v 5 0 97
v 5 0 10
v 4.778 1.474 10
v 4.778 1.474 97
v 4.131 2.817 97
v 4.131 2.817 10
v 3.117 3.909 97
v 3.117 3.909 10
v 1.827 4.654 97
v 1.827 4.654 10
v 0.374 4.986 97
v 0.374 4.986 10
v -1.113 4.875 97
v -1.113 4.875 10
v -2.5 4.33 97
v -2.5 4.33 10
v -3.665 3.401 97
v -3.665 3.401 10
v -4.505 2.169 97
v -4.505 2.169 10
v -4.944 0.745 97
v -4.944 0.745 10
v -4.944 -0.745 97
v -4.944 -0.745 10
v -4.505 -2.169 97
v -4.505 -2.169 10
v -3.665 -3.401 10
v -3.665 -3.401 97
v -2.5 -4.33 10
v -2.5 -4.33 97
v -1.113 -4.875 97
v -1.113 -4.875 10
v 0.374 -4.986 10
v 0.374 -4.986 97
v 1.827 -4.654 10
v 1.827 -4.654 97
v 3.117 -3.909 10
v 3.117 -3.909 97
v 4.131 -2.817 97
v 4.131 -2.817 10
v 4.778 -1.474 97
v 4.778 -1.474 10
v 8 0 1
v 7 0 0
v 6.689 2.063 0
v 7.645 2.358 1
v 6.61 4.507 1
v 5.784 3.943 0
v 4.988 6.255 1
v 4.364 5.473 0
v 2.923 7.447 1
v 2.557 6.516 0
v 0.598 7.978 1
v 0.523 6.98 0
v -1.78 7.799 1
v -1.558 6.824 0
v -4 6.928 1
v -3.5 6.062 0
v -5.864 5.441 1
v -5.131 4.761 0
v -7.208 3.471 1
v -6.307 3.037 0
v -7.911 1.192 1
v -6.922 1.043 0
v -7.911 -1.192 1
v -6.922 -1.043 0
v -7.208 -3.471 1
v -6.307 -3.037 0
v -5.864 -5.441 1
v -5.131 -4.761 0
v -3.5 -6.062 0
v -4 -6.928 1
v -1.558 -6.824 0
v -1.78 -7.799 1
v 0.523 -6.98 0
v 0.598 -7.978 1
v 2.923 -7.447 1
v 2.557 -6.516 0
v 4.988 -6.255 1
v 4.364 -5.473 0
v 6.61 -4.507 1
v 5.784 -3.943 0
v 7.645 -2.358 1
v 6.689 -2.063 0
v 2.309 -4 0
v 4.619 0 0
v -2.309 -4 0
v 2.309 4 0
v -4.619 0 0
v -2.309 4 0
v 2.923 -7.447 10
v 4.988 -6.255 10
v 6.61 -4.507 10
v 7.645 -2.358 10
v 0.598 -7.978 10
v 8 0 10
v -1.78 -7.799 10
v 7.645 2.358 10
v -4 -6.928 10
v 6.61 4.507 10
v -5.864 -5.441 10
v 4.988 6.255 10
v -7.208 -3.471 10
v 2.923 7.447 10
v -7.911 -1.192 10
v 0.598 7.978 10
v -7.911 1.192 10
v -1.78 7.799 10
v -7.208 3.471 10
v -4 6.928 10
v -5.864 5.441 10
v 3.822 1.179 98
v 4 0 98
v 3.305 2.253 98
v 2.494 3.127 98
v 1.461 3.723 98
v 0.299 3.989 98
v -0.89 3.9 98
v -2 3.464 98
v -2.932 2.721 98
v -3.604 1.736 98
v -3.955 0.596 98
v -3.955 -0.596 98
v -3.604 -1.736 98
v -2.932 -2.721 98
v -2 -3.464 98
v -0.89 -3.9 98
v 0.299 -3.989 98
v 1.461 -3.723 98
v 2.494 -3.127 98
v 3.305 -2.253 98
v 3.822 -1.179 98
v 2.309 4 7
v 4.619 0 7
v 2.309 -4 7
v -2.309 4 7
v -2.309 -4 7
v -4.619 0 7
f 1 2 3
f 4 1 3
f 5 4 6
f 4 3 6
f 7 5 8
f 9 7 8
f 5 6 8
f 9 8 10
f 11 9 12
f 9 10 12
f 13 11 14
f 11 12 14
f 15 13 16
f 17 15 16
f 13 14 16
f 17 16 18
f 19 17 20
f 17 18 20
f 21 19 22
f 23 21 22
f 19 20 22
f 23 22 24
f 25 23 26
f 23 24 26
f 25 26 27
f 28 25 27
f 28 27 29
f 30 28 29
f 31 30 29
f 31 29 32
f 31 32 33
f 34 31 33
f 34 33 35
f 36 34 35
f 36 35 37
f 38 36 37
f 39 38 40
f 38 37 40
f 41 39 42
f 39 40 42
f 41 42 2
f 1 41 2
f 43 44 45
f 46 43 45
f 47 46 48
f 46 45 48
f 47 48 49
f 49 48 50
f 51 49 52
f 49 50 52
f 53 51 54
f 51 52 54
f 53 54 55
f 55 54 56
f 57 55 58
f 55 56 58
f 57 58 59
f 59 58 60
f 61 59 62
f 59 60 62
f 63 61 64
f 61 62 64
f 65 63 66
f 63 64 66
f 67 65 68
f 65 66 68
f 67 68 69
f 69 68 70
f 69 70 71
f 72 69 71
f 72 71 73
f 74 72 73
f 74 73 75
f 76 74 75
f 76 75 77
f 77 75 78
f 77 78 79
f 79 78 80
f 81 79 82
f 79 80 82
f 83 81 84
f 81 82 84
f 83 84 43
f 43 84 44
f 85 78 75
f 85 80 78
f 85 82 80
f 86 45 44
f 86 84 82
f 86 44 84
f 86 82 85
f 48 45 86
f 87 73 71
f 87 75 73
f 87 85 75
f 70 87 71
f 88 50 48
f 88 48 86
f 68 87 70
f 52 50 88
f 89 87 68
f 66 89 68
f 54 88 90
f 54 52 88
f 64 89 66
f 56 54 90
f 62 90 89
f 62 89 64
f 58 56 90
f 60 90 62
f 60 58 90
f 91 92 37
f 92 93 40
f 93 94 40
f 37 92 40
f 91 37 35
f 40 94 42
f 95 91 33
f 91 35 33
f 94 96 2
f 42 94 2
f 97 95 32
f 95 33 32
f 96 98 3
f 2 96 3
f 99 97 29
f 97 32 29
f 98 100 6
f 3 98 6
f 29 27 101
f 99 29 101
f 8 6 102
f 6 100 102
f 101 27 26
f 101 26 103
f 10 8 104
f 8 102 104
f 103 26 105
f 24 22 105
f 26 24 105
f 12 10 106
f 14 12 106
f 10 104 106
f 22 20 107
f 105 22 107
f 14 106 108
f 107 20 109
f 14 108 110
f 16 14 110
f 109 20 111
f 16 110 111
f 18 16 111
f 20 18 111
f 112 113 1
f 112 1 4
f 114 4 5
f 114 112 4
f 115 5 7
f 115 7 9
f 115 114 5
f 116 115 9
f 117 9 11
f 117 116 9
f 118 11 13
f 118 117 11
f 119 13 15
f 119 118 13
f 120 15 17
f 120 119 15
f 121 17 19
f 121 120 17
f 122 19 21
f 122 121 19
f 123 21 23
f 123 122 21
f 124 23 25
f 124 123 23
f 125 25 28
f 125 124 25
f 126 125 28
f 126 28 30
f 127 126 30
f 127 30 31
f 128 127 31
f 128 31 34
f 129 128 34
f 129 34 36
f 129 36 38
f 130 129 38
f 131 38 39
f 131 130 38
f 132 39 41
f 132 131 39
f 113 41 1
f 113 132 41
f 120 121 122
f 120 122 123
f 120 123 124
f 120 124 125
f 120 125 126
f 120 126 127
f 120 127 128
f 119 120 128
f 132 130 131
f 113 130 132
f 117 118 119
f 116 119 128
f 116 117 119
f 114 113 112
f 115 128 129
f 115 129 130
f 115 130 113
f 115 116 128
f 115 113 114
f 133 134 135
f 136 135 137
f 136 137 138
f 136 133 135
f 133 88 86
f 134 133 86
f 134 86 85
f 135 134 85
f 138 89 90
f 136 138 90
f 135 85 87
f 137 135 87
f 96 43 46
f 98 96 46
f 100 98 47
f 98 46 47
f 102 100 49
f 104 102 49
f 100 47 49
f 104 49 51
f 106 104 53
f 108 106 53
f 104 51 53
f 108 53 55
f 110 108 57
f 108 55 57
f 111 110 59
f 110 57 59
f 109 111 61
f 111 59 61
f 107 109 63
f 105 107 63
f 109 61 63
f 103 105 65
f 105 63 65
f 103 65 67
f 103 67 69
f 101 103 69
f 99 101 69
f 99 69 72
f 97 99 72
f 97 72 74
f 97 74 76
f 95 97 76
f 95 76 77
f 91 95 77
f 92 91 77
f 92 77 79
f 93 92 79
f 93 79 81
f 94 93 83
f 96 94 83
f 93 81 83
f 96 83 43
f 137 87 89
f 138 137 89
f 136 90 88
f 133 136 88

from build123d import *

# Parameters (mm, degrees)
SKETCH_1_W          = 8
SKETCH_1_H          = 10
SKETCH_2_R          = 5
EXTRUDE_1_DEPTH     = 88
CUT_EXTRUDE_1_DEPTH = 7
CHAMFER_1_SIZE2     = 1.000000001
CHAMFER_1_SIZE      = 0.999999999


with BuildPart() as part:
    # 草图1 → 旋转1 (revolve)
    with BuildSketch(Plane(origin=(0, 0, 0), x_dir=(1, 0, 0), z_dir=(0, 1, 0))):
        with Locations((4, -5)):
            Rectangle(SKETCH_1_W, SKETCH_1_H)
    revolve(axis=Axis((0, 0, 0), (0, 0, 1)))

    # 草图2 → 凸台-拉伸1 (add)
    with BuildSketch(Plane.XY.offset(10)):
        Circle(SKETCH_2_R)
    extrude(amount=EXTRUDE_1_DEPTH)

    # 草图3 → 切除-拉伸1 (cut)
    with BuildSketch(Plane(origin=(0, 0, 0), x_dir=(-1, 0, 0), z_dir=(0, 0, -1))):
        Polygon((-2.309401077, 4), (-4.618802154, 0), (-2.309401077, -4), (2.309401077, -4), (4.618802154, 0), (2.309401077, 4), align=None)
    extrude(amount=-CUT_EXTRUDE_1_DEPTH, mode=Mode.SUBTRACT)

    # 倒角1
    chamfer_1_edges = [part.edges().sort_by_distance(p)[0] for p in [
        (-5, 0, 98),
        (-8, 0, 0),
    ]]
    chamfer(chamfer_1_edges, length=CHAMFER_1_SIZE, length2=CHAMFER_1_SIZE2)


solid = part.part
